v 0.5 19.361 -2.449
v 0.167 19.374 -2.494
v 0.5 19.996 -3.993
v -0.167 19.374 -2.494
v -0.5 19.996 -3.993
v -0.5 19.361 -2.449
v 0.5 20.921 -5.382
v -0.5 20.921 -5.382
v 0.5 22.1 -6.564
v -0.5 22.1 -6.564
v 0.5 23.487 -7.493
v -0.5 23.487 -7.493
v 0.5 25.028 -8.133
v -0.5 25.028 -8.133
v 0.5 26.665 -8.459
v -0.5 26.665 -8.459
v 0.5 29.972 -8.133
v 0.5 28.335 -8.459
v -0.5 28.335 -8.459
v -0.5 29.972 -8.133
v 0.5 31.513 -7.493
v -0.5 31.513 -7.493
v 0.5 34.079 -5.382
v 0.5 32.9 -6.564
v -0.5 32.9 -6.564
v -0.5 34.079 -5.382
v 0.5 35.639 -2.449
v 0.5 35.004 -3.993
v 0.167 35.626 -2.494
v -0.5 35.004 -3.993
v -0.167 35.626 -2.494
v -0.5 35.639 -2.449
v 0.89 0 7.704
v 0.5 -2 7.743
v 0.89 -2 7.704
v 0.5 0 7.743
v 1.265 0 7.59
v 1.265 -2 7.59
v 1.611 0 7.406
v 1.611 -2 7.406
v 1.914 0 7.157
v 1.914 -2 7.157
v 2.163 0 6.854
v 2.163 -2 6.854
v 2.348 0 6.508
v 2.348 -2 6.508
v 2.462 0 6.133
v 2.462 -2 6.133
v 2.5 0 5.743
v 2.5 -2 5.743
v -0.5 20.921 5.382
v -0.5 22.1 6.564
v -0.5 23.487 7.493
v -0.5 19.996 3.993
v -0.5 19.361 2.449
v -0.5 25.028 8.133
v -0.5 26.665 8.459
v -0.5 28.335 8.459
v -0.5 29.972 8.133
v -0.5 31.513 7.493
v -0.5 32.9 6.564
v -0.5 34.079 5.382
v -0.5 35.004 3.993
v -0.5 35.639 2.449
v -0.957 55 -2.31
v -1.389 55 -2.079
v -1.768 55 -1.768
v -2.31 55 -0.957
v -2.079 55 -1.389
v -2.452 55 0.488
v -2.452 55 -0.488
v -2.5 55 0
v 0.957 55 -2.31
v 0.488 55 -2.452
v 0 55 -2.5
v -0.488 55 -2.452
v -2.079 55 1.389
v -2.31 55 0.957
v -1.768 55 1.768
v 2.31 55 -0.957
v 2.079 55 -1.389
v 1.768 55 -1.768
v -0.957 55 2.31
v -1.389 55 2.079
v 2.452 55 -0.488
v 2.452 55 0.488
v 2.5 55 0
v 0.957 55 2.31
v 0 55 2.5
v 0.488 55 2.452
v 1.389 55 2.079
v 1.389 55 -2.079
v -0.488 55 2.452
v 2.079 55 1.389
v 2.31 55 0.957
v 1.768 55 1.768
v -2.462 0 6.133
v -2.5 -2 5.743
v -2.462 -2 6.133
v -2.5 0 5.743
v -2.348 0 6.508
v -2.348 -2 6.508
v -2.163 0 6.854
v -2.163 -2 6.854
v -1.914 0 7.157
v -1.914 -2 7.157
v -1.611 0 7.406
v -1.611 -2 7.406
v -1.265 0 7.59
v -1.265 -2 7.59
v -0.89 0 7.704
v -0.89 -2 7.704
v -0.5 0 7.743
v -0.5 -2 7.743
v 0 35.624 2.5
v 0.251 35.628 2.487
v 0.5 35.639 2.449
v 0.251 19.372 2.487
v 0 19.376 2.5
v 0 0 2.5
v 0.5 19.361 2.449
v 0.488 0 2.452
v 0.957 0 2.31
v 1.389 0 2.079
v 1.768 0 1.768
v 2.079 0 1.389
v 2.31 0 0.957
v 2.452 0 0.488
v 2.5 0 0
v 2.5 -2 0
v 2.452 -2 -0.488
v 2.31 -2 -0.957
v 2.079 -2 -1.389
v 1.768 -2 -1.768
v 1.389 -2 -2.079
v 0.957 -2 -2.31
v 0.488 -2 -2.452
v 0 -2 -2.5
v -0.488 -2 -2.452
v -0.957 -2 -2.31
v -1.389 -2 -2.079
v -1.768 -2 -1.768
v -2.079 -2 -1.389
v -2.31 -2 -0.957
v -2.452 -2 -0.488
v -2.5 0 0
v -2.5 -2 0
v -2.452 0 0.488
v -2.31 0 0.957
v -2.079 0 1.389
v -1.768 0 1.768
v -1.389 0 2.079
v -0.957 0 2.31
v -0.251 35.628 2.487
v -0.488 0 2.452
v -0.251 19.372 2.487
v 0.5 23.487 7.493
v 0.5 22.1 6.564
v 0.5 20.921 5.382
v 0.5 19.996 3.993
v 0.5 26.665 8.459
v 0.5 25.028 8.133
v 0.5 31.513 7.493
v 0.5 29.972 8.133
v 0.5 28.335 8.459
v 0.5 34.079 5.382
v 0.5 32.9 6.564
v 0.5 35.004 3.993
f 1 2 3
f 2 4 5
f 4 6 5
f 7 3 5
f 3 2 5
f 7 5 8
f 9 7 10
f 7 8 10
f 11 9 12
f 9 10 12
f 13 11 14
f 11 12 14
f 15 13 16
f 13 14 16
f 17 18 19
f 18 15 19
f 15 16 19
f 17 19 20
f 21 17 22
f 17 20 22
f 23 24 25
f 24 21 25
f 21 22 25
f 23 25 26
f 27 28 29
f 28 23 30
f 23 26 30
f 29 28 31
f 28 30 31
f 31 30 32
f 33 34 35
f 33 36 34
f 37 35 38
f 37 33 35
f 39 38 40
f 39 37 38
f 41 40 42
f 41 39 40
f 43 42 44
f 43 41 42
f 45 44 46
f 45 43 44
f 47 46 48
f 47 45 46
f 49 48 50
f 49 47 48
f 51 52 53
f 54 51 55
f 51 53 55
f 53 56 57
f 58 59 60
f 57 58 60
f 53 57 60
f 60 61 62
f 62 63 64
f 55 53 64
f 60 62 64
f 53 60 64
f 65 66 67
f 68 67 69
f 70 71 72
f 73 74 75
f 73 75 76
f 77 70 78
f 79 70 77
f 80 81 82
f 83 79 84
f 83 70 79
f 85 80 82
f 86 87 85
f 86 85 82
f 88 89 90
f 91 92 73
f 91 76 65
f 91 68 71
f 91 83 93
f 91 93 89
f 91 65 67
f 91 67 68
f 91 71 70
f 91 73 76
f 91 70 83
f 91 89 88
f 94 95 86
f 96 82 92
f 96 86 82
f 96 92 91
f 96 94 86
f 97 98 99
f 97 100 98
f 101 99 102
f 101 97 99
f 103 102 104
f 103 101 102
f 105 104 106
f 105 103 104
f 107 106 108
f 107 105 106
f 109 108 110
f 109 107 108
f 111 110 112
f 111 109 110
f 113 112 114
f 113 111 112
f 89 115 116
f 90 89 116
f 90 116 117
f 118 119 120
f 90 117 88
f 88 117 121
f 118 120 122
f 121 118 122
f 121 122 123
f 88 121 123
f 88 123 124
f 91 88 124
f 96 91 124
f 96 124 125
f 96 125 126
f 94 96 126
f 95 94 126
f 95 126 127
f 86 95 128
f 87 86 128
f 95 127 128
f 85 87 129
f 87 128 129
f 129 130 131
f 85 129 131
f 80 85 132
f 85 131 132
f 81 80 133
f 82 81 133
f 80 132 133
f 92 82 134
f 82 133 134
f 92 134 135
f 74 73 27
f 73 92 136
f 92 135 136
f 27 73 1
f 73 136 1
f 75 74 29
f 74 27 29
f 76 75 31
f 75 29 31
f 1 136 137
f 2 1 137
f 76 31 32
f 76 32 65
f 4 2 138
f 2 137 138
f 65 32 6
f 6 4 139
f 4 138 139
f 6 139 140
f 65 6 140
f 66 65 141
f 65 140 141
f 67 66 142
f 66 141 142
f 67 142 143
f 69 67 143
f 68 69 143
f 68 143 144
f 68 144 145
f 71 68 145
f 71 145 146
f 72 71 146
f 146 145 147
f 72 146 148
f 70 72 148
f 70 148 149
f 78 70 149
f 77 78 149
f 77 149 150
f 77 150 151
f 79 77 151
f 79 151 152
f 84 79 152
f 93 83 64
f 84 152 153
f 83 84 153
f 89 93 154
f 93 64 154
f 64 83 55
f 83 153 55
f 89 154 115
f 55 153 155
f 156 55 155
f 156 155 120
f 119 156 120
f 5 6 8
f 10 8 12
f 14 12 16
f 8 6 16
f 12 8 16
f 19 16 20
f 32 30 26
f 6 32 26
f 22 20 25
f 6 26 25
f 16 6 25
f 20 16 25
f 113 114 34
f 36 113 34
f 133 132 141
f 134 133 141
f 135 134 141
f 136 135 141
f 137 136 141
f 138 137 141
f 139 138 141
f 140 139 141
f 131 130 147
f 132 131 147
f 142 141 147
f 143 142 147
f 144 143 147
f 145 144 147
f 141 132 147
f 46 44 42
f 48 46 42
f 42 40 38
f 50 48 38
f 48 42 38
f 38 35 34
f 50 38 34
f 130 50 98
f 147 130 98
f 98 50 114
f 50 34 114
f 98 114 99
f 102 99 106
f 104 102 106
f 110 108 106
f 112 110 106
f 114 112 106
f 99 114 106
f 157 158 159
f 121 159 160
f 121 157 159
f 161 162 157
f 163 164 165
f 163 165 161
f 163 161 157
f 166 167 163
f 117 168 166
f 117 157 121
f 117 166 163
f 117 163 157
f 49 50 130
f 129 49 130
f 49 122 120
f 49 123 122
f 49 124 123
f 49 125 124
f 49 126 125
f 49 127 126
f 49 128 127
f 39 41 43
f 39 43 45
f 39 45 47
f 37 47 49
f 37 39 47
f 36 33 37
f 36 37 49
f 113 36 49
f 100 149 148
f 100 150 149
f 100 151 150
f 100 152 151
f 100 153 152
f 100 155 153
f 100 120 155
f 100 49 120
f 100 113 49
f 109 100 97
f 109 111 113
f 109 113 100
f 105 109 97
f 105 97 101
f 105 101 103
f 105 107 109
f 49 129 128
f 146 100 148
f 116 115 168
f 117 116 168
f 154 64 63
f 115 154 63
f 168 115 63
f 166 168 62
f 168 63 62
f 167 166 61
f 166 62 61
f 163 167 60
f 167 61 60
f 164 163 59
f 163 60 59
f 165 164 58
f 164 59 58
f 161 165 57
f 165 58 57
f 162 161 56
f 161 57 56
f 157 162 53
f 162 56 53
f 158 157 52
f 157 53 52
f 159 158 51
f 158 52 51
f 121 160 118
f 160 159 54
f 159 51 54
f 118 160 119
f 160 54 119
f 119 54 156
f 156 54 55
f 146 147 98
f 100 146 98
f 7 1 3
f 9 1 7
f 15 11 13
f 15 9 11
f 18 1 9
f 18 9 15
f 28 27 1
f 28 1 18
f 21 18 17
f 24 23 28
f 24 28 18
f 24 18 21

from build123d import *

# Parameters (mm, degrees)
SKETCH1_R                = 2.5
BOSS_EXTRUDE1_DEPTH      = 55
BOSS_EXTRUDE2_DEPTH      = 0.5
BOSS_EXTRUDE2_DEPTH_BACK = 0.5
SKETCH2_R                = 8.5
BOSS_EXTRUDE3_START      = 2
BOSS_EXTRUDE3_DEPTH      = 2
FILLET1_R                = 2


with BuildPart() as part:
    # Sketch1 → Boss-Extrude1 (new body)
    with BuildSketch(Plane(origin=(0, 0, 0), x_dir=(1, 0, 0), z_dir=(0, 1, 0))):
        Circle(SKETCH1_R)
    extrude(amount=BOSS_EXTRUDE1_DEPTH)

    # Sketch2 → Boss-Extrude2 (add, two sides: drawn at the far end of the back side and taken through both)
    with BuildSketch(Plane(origin=(0, 0, 0), x_dir=(0, 0, -1), z_dir=(1, 0, 0)).offset(-BOSS_EXTRUDE2_DEPTH_BACK)):
        with Locations((0, 27.5)):
            Circle(SKETCH2_R)
    extrude(amount=BOSS_EXTRUDE2_DEPTH + BOSS_EXTRUDE2_DEPTH_BACK)

    # Sketch3 → Boss-Extrude3 (add)
    with BuildSketch(Plane.XZ.offset(BOSS_EXTRUDE3_START)):
        with BuildLine():
            Line((-2.5, 0), (-2.5, 7.742565285))
            Line((-2.5, 7.742565285), (2.5, 7.742565285))
            Line((2.5, 7.742565285), (2.5, 0))
            ThreePointArc((2.5, 0), (0, -2.5), (-2.5, 0))
        make_face()
    extrude(amount=-BOSS_EXTRUDE3_DEPTH)

    # Fillet1
    fillet1_edges = [part.edges().sort_by_distance(p)[0] for p in [
        (-2.5, -1, 7.742565285),
        (2.5, -1, 7.742565285),
    ]]
    fillet(fillet1_edges, radius=FILLET1_R)


solid = part.part
